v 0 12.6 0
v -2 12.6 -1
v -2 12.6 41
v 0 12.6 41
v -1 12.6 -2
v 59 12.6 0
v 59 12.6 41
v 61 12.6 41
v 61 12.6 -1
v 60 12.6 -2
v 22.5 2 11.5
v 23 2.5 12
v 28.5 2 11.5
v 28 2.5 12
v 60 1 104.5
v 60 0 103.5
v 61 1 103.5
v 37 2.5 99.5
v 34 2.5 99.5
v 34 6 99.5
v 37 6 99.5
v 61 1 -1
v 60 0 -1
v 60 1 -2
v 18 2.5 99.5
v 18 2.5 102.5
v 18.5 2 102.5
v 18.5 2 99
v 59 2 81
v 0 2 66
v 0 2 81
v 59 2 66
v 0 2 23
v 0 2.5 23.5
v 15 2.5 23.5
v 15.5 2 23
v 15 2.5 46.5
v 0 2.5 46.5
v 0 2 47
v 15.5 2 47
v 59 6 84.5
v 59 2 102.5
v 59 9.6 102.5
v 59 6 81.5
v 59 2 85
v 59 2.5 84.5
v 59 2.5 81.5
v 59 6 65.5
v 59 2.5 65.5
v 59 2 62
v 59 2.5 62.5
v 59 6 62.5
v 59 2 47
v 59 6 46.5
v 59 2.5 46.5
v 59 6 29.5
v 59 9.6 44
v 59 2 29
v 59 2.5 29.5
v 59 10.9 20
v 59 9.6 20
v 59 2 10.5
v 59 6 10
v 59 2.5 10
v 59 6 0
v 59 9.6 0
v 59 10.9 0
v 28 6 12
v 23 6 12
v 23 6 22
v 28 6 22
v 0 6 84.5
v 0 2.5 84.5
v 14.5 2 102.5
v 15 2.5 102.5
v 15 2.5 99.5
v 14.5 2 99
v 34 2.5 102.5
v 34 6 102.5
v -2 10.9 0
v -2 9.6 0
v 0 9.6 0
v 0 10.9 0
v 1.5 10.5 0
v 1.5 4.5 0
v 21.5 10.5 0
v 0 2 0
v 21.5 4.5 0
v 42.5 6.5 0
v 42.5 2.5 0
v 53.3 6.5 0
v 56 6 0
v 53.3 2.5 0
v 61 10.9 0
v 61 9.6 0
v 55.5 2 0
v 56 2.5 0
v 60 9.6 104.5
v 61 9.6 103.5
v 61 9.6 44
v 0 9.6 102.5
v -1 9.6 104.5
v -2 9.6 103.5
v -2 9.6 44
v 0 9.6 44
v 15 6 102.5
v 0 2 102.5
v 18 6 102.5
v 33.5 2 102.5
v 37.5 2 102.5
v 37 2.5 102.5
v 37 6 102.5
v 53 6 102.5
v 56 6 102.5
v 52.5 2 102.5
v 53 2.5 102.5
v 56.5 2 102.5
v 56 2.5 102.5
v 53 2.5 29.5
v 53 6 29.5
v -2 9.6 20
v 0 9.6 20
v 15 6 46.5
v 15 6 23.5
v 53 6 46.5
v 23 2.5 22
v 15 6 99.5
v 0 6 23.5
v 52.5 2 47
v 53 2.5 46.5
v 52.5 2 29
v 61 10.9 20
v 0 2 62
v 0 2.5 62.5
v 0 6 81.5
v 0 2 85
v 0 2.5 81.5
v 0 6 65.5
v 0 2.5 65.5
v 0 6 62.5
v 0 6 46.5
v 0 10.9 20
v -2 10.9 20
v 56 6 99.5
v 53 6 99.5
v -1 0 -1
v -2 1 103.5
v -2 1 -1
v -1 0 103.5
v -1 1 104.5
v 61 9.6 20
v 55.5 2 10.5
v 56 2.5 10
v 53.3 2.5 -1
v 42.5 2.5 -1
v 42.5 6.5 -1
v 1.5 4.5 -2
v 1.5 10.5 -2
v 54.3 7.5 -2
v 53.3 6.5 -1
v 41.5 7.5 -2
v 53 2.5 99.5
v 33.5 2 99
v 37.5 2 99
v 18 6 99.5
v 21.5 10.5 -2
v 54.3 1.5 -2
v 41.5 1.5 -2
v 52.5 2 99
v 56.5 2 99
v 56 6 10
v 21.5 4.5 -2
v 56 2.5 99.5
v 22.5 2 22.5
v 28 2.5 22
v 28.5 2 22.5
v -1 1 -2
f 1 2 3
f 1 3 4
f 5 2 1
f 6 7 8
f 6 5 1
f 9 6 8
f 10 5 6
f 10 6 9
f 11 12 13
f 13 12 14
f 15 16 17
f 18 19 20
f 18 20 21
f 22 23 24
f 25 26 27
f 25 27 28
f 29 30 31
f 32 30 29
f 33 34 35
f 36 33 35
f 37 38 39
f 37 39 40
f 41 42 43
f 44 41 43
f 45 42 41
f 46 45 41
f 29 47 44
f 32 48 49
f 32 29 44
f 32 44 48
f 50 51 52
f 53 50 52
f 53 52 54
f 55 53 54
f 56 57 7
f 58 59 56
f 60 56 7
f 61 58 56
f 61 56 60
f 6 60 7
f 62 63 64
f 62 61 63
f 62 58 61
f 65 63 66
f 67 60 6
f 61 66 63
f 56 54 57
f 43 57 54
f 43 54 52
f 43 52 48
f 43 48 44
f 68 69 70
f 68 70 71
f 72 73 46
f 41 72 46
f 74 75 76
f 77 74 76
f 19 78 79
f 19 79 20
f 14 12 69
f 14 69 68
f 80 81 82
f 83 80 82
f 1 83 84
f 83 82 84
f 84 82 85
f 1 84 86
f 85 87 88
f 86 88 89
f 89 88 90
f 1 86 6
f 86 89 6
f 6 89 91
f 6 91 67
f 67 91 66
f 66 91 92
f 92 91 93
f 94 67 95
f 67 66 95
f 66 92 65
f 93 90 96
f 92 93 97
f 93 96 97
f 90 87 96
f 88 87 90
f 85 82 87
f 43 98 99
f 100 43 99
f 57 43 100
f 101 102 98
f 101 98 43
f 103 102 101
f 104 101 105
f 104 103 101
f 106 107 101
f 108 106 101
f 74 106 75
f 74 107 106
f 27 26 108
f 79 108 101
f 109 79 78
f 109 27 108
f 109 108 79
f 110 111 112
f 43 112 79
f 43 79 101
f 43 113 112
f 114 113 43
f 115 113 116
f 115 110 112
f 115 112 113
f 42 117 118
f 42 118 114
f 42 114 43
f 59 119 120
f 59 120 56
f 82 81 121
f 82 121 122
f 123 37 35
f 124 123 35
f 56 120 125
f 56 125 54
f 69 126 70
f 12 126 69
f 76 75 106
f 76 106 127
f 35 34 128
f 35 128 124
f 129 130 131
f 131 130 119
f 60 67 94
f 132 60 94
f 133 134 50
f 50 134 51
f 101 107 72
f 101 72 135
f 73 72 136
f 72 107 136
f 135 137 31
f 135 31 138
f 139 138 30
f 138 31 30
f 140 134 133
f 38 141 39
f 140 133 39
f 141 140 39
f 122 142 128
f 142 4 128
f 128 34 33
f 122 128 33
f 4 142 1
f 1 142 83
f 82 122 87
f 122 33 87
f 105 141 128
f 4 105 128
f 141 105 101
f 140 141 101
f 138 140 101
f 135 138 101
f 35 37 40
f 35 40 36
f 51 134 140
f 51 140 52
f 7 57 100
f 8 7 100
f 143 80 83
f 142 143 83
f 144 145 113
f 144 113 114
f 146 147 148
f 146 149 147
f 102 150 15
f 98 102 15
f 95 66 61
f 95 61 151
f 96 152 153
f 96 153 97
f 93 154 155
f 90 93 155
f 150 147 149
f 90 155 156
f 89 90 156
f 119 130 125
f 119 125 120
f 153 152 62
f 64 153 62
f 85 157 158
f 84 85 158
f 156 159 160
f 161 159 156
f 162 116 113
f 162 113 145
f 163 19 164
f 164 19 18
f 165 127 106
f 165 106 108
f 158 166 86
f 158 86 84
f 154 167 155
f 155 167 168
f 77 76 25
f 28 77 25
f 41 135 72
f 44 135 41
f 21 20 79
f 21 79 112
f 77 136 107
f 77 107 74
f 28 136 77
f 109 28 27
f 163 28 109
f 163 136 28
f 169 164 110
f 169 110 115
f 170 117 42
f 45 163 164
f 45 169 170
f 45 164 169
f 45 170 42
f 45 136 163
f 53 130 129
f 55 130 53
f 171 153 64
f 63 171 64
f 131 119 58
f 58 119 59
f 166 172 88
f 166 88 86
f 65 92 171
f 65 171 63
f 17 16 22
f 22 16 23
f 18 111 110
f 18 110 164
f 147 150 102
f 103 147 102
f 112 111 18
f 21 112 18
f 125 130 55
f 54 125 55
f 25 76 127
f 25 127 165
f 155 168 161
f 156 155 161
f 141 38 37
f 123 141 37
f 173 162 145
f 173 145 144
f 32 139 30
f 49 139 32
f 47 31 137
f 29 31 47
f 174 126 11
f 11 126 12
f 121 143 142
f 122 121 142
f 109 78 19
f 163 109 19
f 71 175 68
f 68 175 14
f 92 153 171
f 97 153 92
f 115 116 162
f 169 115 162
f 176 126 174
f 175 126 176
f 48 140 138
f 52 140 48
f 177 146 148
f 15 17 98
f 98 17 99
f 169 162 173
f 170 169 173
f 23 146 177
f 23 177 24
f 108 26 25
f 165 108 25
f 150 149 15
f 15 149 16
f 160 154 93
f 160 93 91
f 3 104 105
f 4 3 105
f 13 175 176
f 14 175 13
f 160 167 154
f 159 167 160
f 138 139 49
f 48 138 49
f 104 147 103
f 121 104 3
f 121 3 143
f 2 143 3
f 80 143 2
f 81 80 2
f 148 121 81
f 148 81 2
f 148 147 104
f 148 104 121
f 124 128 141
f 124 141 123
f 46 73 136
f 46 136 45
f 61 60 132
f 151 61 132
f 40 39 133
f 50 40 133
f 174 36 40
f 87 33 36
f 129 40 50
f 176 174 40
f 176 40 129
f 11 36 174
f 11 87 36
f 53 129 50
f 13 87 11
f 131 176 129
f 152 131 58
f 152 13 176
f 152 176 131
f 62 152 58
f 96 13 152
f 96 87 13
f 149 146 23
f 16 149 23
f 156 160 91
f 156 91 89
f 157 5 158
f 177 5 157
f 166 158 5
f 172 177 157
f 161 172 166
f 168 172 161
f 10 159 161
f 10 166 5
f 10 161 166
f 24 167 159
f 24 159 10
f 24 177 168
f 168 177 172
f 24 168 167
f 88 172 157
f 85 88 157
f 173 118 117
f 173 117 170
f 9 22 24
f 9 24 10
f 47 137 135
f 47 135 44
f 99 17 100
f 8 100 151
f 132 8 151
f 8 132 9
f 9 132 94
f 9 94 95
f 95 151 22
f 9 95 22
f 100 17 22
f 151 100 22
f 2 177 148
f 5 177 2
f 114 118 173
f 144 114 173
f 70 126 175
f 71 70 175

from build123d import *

# Parameters (mm, degrees)
SKETCH1_W               = 59
SKETCH1_H               = 102.5
BOSS_EXTRUDE1_DEPTH     = 2
SKETCH2_W               = 63
SKETCH2_H               = 106.5
SKETCH2_W_2             = 59
SKETCH2_H_2             = 102.5
BOSS_EXTRUDE2_DEPTH     = 12.6
SKETCH4_W               = 59
SKETCH4_H               = 3
SKETCH4_W_2             = 3
SKETCH4_W_3             = 15
SKETCH4_H_2             = 23
SKETCH4_W_4             = 6
SKETCH4_H_3             = 17
SKETCH4_H_4             = 10
SKETCH4_W_5             = 5
BOSS_EXTRUDE3_DEPTH     = 4
CUT_EXTRUDE1_REACH      = 125.378
SKETCH5_W               = 20
SKETCH5_H               = 6
SKETCH5_W_2             = 10.8
SKETCH5_H_2             = 4
CHAMFER1_SIZE           = 0.5
CHAMFER2_SIZE           = 1
SKETCH6_W               = 2
SKETCH6_H               = 1.3
CUT_EXTRUDE2_DEPTH      = 20
CUT_EXTRUDE3_DEPTH      = 122.655291706
CUT_EXTRUDE3_DEPTH_BACK = 122.655291706
SKETCH7_W               = 60.5
SKETCH7_H               = 3
CHAMFER3_SIZE           = 3


with BuildPart() as part:
    # Sketch1 → Boss-Extrude1 (new body)
    with BuildSketch(Plane(origin=(0, 0, 0), x_dir=(1, 0, 0), z_dir=(0, 1, 0))):
        with Locations((29.5, -51.25)):
            Rectangle(SKETCH1_W, SKETCH1_H)
    extrude(amount=BOSS_EXTRUDE1_DEPTH)

    # Sketch2 → Boss-Extrude2 (add)
    with BuildSketch(Plane(origin=(0, 0, 0), x_dir=(1, 0, 0), z_dir=(0, 1, 0))):
        with Locations((29.5, -51.25)):
            Rectangle(SKETCH2_W, SKETCH2_H)
        with Locations((29.5, -51.25)):
            Rectangle(SKETCH2_W_2, SKETCH2_H_2, mode=Mode.SUBTRACT)
    extrude(amount=BOSS_EXTRUDE2_DEPTH)

    # Sketch4 → Boss-Extrude3 (add)
    with BuildSketch(Plane(origin=(0, 2, 0), x_dir=(1, 0, 0), z_dir=(0, 1, 0))):
        with Locations((29.5, -83)):
            Rectangle(SKETCH4_W, SKETCH4_H)
        with Locations((29.5, -64)):
            Rectangle(SKETCH4_W, SKETCH4_H)
        with Locations((16.5, -101)):
            Rectangle(SKETCH4_W_2, SKETCH4_H)
        with Locations((35.5, -101)):
            Rectangle(SKETCH4_W_2, SKETCH4_H)
        with Locations((54.5, -101)):
            Rectangle(SKETCH4_W_2, SKETCH4_H)
        with Locations((7.5, -35)):
            Rectangle(SKETCH4_W_3, SKETCH4_H_2)
        with Locations((56, -38)):
            Rectangle(SKETCH4_W_4, SKETCH4_H_3)
        with Locations((57.5, -5)):
            Rectangle(SKETCH4_W_2, SKETCH4_H_4)
        with Locations((25.5, -17)):
            Rectangle(SKETCH4_W_5, SKETCH4_H_4)
    extrude(amount=BOSS_EXTRUDE3_DEPTH)

    # Sketch5 → Cut-Extrude1 (cut, up to next)
    with BuildSketch(Plane(origin=(0, 0, -2), x_dir=(-1, 0, 0), z_dir=(0, 0, -1)), mode=Mode.PRIVATE) as cut_extrude1_sk1:
        with Locations((-11.5, 7.5)):
            Rectangle(SKETCH5_W, SKETCH5_H)
    cut_extrude1_tool1 = extrude(cut_extrude1_sk1.sketch, amount=-CUT_EXTRUDE1_REACH, mode=Mode.PRIVATE) & part.part
    # Sketch5 → Cut-Extrude1 (cut, up to next)
    with BuildSketch(Plane(origin=(0, 0, -2), x_dir=(-1, 0, 0), z_dir=(0, 0, -1)), mode=Mode.PRIVATE) as cut_extrude1_sk2:
        with Locations((-47.9, 4.5)):
            Rectangle(SKETCH5_W_2, SKETCH5_H_2)
    cut_extrude1_tool2 = extrude(cut_extrude1_sk2.sketch, amount=-CUT_EXTRUDE1_REACH, mode=Mode.PRIVATE) & part.part
    add(cut_extrude1_tool1.solids().sort_by_distance((11.5, 7.5, -2))[0], mode=Mode.SUBTRACT)
    add(cut_extrude1_tool2.solids().sort_by_distance((47.9, 4.5, -2))[0], mode=Mode.SUBTRACT)

    # Chamfer1
    chamfer1_edges = [part.edges().sort_by_distance(p)[0] for p in [
        (18, 2, 101),
        (15, 2, 101),
        (16.5, 2, 99.5),
        (37, 2, 101),
        (34, 2, 101),
        (35.5, 2, 99.5),
        (56, 2, 101),
        (53, 2, 101),
        (54.5, 2, 99.5),
        (29.5, 2, 84.5),
        (29.5, 2, 81.5),
        (28, 2, 17),
        (25.5, 2, 22),
        (23, 2, 17),
        (25.5, 2, 12),
        (56, 2, 5),
        (57.5, 2, 10),
        (56, 2, 46.5),
        (53, 2, 38),
        (56, 2, 29.5),
        (7.5, 2, 23.5),
        (15, 2, 35),
        (7.5, 2, 46.5),
        (29.5, 2, 65.5),
        (29.5, 2, 62.5),
    ]]
    chamfer(chamfer1_edges, length=CHAMFER1_SIZE)

    # Chamfer2
    chamfer2_edges = [part.edges().sort_by_distance(p)[0] for p in [
        (-2, 0, 51.25),
        (-2, 6.3, 104.5),
        (29.5, 0, -2),
        (-2, 6.3, -2),
        (61, 0, 51.25),
        (61, 6.3, -2),
        (29.5, 0, 104.5),
        (61, 6.3, 104.5),
        (53.3, 4.5, -2),
        (47.9, 2.5, -2),
        (42.5, 4.5, -2),
        (47.9, 6.5, -2),
    ]]
    chamfer(chamfer2_edges, length=CHAMFER2_SIZE)

    # Sketch6 → Cut-Extrude2 (cut)
    with BuildSketch(Plane.XY):
        with Locations((-1, 10.25)):
            Rectangle(SKETCH6_W, SKETCH6_H)
        with Locations((60, 10.25)):
            Rectangle(SKETCH6_W, SKETCH6_H)
    extrude(amount=CUT_EXTRUDE2_DEPTH, mode=Mode.SUBTRACT)

    # Sketch7 → Cut-Extrude3 (cut, two sides: drawn at the far end of the back side and taken through both)
    with BuildSketch(Plane(origin=(0, 0, 0), x_dir=(0, 0, -1), z_dir=(1, 0, 0)).offset(-CUT_EXTRUDE3_DEPTH_BACK)):
        with Locations((-74.25, 11.1)):
            Rectangle(SKETCH7_W, SKETCH7_H)
    extrude(amount=CUT_EXTRUDE3_DEPTH + CUT_EXTRUDE3_DEPTH_BACK, mode=Mode.SUBTRACT)

    # Chamfer3
    chamfer3_edges = [part.edges().sort_by_distance(p)[0] for p in [
        (-1, 12.6, 44),
        (60, 12.6, 44),
    ]]
    chamfer(chamfer3_edges, length=CHAMFER3_SIZE - 0.0001)  # a hair under: the kernel refuses the full size


solid = part.part
